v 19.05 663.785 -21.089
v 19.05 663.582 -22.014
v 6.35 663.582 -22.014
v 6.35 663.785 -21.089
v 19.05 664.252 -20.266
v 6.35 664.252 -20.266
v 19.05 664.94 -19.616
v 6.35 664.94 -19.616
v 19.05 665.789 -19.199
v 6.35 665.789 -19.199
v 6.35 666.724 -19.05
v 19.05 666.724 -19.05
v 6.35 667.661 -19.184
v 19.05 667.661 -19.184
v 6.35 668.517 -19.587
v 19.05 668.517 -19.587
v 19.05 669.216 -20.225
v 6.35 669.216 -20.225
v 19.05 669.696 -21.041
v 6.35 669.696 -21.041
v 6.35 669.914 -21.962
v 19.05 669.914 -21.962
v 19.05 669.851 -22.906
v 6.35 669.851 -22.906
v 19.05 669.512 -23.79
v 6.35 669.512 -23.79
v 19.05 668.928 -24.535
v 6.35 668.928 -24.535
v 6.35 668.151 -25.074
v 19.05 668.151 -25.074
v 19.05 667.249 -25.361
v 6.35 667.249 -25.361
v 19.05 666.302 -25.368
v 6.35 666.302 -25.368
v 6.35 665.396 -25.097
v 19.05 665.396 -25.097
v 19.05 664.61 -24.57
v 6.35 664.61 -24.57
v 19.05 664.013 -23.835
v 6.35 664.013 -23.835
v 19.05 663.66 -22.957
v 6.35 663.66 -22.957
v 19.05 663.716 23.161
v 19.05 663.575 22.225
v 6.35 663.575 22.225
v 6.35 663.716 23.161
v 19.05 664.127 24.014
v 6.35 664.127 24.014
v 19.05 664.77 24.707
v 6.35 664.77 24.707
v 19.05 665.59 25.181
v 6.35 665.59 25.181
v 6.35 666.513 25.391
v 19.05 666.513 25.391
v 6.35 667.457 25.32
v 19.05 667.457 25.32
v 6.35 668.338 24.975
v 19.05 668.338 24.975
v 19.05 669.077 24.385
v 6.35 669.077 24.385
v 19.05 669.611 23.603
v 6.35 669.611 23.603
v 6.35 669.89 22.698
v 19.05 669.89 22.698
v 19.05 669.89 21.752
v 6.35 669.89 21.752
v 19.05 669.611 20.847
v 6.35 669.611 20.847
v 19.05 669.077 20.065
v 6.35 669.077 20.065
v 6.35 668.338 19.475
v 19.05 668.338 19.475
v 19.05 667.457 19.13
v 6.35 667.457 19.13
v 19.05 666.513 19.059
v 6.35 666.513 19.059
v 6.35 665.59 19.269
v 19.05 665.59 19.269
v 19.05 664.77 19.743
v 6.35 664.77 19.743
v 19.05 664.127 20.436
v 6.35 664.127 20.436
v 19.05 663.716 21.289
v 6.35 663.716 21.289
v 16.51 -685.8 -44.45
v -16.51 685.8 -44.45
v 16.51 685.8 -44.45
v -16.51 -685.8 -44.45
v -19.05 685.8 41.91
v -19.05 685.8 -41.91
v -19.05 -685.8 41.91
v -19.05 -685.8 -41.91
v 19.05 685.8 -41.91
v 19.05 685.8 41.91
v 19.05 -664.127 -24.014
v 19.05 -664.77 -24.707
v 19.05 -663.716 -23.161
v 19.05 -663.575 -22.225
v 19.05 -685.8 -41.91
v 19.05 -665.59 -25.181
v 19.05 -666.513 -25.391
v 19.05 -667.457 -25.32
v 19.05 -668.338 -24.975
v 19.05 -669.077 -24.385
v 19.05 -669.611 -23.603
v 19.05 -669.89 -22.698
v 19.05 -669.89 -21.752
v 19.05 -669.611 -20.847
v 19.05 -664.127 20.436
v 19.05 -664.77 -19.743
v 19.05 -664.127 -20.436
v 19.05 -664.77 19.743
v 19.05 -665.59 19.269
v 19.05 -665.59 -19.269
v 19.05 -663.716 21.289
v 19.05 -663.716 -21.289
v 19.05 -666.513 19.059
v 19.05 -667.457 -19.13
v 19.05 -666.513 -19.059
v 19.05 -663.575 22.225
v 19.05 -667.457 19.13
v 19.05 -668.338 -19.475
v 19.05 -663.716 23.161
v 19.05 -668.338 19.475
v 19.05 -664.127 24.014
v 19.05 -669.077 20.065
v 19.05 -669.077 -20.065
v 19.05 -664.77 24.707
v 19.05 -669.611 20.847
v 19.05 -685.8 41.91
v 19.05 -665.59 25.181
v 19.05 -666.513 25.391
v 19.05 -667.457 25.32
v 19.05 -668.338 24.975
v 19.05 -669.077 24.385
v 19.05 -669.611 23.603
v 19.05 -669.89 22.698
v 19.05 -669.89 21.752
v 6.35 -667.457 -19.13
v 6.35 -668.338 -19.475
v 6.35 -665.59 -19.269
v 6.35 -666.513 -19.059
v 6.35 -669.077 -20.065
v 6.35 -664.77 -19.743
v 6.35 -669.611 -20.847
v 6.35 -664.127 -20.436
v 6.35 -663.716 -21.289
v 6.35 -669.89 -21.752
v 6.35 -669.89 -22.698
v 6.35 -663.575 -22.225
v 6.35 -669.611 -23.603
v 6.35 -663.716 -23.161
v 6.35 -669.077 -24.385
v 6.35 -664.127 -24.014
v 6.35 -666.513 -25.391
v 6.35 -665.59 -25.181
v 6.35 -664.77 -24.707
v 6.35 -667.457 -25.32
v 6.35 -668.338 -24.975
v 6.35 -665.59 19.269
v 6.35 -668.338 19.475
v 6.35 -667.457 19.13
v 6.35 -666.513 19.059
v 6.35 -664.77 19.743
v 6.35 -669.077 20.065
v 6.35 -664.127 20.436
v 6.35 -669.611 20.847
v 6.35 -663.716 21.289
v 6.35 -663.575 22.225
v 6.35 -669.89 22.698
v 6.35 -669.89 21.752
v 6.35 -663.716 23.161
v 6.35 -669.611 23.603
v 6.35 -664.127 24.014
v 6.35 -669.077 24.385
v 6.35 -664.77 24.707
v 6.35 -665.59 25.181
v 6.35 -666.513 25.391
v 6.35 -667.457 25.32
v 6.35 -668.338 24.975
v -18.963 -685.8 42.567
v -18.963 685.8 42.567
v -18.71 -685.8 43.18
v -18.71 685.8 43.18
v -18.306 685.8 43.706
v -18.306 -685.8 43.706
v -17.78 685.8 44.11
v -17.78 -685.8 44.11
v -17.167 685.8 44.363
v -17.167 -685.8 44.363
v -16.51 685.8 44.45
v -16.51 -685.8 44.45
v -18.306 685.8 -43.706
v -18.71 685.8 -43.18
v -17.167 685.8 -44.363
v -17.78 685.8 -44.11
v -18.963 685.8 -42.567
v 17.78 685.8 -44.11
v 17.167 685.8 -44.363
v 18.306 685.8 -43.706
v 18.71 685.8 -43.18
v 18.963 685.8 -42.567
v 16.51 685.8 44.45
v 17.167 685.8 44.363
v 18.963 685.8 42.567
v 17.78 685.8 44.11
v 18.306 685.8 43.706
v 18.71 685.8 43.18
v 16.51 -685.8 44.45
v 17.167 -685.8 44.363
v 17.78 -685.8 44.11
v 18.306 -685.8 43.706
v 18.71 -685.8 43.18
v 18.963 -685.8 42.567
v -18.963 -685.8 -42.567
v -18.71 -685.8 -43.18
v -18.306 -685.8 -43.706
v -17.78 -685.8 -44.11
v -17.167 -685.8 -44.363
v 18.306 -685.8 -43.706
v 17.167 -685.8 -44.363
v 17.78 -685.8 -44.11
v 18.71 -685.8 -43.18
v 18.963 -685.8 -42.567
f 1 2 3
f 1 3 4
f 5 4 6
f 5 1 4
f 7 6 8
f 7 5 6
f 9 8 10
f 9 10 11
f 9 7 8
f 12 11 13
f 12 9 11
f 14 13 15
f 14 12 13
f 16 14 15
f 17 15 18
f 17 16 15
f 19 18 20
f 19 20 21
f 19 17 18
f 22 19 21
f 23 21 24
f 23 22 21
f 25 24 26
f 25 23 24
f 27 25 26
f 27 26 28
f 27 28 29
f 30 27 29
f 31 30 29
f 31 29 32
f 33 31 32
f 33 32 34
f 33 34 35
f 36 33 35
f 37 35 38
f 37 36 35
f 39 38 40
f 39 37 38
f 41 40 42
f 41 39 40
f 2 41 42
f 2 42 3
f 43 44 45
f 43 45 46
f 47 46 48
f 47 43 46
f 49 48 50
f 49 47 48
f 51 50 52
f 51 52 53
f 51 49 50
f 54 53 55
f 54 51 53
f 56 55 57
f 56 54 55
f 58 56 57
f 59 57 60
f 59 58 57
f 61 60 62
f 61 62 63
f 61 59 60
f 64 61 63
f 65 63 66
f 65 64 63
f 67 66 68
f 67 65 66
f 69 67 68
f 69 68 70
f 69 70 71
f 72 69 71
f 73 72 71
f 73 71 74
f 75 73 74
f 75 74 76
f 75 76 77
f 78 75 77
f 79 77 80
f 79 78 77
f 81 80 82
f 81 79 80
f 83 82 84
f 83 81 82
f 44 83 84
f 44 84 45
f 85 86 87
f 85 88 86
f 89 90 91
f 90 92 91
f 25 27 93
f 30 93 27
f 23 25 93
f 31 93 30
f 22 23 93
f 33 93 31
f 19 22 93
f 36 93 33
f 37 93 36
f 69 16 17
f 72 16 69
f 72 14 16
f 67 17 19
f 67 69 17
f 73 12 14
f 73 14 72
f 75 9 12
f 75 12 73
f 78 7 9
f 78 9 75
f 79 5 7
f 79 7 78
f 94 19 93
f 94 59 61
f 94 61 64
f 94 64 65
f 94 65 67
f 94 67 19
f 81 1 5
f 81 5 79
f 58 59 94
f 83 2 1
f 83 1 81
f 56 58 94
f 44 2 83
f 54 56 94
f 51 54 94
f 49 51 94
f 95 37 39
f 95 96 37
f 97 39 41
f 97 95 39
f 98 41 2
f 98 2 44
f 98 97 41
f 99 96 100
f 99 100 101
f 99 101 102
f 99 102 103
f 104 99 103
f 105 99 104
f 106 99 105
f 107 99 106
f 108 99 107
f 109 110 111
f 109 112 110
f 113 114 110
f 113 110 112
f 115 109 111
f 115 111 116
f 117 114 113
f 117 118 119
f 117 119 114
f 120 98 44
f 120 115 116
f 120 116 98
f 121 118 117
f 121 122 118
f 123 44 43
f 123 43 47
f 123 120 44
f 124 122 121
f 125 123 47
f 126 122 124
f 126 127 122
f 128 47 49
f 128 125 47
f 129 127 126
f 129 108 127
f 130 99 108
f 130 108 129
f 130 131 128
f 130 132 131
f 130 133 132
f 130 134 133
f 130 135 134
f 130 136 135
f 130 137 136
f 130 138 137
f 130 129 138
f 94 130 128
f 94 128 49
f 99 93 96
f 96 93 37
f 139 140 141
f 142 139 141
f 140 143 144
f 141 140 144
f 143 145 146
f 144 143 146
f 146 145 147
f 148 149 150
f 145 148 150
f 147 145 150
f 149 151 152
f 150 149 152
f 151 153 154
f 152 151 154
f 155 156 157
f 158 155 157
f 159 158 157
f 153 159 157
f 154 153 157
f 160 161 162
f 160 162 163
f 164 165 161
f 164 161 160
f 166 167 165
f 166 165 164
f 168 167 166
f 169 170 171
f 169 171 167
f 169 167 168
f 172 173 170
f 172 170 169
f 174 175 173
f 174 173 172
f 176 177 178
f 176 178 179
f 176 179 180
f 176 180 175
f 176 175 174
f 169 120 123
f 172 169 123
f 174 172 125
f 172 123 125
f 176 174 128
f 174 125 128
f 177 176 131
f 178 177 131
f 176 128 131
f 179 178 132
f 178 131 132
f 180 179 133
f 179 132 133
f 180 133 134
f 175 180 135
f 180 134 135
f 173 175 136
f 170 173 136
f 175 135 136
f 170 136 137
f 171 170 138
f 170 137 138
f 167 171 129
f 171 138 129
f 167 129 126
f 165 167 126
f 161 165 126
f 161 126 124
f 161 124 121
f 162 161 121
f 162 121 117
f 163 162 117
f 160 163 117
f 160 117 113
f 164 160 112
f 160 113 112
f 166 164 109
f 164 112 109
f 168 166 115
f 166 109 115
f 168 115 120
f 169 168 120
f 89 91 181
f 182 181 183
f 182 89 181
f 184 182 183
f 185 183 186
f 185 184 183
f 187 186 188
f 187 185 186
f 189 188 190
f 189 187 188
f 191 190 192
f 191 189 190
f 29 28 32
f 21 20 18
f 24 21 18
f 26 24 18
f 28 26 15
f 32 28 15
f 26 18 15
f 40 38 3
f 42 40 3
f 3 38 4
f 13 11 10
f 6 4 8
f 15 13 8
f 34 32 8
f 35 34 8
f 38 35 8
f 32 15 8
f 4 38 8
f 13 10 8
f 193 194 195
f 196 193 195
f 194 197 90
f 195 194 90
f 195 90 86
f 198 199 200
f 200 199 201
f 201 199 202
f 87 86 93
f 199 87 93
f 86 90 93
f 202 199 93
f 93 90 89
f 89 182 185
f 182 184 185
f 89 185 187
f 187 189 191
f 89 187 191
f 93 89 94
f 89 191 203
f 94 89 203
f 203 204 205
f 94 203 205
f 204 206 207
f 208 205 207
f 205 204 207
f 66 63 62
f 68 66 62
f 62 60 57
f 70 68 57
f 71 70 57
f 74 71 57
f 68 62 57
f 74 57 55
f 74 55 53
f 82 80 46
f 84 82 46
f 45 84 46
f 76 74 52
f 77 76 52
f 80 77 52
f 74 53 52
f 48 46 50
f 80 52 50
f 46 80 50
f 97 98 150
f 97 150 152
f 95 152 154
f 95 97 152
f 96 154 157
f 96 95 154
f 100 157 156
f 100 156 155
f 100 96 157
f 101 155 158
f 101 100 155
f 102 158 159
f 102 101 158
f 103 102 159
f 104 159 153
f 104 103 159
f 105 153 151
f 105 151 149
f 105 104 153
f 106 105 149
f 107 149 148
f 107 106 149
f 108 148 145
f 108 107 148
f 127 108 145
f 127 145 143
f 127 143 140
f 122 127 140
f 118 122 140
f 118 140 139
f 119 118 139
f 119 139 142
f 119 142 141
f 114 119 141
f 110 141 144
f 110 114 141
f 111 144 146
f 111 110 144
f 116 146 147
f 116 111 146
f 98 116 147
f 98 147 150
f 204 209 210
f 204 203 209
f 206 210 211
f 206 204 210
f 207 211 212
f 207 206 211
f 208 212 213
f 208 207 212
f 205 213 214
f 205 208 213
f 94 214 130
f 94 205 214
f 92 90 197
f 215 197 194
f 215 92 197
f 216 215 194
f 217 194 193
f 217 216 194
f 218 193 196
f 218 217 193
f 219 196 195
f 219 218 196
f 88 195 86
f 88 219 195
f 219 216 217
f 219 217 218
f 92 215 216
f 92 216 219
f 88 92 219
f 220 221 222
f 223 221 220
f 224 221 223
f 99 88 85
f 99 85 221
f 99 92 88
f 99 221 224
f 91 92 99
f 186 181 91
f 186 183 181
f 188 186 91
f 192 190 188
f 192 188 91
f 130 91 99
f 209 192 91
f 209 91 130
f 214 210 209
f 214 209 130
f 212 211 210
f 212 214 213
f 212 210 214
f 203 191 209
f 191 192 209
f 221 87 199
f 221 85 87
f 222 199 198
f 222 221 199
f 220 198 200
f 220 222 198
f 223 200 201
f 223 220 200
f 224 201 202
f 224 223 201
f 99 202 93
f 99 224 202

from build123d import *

# Parameters (mm, degrees)
F0_W          = 38.1
F0_H          = 88.9
F1_DEPTH      = 685.8
F1_DEPTH_BACK = 685.8
F2_R          = 3.175
F3_DEPTH      = 12.7
F4_R          = 2.54


# Not quite as in the source:
# - a length typed as a fraction of an inch, garbled in the dataset ("3 / 203.2 mm" for 3/8 in), is restored
# - a pattern or mirror of a feature is missing from the dataset's text; its kind, count and spacing are read off the source's solid


with BuildPart() as f1:
    # F0 (on Front) → F1 (new body, two sides)
    with BuildSketch(Plane.XZ) as f1_sk:
        Rectangle(F0_W, F0_H)
    extrude(amount=F1_DEPTH)
    extrude(f1_sk.sketch, amount=-F1_DEPTH_BACK)

    # F2 (on face) → F3 (cut)
    with BuildSketch(Plane.YZ.offset(19.05)):
        with Locations((-666.75, 22.225)):
            Circle(F2_R)
    f3 = extrude(amount=-F3_DEPTH, mode=Mode.SUBTRACT)

    # F3_copies: F3 across plane
    add(f3.mirror(Plane(origin=(0, 0, 0), x_dir=(0, 0.0333148302, 0.999444907), z_dir=(0, 0.999444907, -0.0333148302))), mode=Mode.SUBTRACT)

    # F3_copies1: F3 across plane
    add(f3.mirror(Plane(origin=(0, 0, 0), x_dir=(-1, 0, 0), z_dir=(0, 0, -1))), mode=Mode.SUBTRACT)

    # F3_copies2: F3 across plane
    add(f3.mirror(Plane.ZX), mode=Mode.SUBTRACT)

    # F4
    f4_edges = [f1.edges().sort_by_distance(p)[0] for p in [
        (19.05, 0, 44.45),
        (-19.05, 0, 44.45),
        (19.05, 0, -44.45),
        (-19.05, 0, -44.45),
    ]]
    fillet(f4_edges, radius=F4_R)


solid = f1.part
